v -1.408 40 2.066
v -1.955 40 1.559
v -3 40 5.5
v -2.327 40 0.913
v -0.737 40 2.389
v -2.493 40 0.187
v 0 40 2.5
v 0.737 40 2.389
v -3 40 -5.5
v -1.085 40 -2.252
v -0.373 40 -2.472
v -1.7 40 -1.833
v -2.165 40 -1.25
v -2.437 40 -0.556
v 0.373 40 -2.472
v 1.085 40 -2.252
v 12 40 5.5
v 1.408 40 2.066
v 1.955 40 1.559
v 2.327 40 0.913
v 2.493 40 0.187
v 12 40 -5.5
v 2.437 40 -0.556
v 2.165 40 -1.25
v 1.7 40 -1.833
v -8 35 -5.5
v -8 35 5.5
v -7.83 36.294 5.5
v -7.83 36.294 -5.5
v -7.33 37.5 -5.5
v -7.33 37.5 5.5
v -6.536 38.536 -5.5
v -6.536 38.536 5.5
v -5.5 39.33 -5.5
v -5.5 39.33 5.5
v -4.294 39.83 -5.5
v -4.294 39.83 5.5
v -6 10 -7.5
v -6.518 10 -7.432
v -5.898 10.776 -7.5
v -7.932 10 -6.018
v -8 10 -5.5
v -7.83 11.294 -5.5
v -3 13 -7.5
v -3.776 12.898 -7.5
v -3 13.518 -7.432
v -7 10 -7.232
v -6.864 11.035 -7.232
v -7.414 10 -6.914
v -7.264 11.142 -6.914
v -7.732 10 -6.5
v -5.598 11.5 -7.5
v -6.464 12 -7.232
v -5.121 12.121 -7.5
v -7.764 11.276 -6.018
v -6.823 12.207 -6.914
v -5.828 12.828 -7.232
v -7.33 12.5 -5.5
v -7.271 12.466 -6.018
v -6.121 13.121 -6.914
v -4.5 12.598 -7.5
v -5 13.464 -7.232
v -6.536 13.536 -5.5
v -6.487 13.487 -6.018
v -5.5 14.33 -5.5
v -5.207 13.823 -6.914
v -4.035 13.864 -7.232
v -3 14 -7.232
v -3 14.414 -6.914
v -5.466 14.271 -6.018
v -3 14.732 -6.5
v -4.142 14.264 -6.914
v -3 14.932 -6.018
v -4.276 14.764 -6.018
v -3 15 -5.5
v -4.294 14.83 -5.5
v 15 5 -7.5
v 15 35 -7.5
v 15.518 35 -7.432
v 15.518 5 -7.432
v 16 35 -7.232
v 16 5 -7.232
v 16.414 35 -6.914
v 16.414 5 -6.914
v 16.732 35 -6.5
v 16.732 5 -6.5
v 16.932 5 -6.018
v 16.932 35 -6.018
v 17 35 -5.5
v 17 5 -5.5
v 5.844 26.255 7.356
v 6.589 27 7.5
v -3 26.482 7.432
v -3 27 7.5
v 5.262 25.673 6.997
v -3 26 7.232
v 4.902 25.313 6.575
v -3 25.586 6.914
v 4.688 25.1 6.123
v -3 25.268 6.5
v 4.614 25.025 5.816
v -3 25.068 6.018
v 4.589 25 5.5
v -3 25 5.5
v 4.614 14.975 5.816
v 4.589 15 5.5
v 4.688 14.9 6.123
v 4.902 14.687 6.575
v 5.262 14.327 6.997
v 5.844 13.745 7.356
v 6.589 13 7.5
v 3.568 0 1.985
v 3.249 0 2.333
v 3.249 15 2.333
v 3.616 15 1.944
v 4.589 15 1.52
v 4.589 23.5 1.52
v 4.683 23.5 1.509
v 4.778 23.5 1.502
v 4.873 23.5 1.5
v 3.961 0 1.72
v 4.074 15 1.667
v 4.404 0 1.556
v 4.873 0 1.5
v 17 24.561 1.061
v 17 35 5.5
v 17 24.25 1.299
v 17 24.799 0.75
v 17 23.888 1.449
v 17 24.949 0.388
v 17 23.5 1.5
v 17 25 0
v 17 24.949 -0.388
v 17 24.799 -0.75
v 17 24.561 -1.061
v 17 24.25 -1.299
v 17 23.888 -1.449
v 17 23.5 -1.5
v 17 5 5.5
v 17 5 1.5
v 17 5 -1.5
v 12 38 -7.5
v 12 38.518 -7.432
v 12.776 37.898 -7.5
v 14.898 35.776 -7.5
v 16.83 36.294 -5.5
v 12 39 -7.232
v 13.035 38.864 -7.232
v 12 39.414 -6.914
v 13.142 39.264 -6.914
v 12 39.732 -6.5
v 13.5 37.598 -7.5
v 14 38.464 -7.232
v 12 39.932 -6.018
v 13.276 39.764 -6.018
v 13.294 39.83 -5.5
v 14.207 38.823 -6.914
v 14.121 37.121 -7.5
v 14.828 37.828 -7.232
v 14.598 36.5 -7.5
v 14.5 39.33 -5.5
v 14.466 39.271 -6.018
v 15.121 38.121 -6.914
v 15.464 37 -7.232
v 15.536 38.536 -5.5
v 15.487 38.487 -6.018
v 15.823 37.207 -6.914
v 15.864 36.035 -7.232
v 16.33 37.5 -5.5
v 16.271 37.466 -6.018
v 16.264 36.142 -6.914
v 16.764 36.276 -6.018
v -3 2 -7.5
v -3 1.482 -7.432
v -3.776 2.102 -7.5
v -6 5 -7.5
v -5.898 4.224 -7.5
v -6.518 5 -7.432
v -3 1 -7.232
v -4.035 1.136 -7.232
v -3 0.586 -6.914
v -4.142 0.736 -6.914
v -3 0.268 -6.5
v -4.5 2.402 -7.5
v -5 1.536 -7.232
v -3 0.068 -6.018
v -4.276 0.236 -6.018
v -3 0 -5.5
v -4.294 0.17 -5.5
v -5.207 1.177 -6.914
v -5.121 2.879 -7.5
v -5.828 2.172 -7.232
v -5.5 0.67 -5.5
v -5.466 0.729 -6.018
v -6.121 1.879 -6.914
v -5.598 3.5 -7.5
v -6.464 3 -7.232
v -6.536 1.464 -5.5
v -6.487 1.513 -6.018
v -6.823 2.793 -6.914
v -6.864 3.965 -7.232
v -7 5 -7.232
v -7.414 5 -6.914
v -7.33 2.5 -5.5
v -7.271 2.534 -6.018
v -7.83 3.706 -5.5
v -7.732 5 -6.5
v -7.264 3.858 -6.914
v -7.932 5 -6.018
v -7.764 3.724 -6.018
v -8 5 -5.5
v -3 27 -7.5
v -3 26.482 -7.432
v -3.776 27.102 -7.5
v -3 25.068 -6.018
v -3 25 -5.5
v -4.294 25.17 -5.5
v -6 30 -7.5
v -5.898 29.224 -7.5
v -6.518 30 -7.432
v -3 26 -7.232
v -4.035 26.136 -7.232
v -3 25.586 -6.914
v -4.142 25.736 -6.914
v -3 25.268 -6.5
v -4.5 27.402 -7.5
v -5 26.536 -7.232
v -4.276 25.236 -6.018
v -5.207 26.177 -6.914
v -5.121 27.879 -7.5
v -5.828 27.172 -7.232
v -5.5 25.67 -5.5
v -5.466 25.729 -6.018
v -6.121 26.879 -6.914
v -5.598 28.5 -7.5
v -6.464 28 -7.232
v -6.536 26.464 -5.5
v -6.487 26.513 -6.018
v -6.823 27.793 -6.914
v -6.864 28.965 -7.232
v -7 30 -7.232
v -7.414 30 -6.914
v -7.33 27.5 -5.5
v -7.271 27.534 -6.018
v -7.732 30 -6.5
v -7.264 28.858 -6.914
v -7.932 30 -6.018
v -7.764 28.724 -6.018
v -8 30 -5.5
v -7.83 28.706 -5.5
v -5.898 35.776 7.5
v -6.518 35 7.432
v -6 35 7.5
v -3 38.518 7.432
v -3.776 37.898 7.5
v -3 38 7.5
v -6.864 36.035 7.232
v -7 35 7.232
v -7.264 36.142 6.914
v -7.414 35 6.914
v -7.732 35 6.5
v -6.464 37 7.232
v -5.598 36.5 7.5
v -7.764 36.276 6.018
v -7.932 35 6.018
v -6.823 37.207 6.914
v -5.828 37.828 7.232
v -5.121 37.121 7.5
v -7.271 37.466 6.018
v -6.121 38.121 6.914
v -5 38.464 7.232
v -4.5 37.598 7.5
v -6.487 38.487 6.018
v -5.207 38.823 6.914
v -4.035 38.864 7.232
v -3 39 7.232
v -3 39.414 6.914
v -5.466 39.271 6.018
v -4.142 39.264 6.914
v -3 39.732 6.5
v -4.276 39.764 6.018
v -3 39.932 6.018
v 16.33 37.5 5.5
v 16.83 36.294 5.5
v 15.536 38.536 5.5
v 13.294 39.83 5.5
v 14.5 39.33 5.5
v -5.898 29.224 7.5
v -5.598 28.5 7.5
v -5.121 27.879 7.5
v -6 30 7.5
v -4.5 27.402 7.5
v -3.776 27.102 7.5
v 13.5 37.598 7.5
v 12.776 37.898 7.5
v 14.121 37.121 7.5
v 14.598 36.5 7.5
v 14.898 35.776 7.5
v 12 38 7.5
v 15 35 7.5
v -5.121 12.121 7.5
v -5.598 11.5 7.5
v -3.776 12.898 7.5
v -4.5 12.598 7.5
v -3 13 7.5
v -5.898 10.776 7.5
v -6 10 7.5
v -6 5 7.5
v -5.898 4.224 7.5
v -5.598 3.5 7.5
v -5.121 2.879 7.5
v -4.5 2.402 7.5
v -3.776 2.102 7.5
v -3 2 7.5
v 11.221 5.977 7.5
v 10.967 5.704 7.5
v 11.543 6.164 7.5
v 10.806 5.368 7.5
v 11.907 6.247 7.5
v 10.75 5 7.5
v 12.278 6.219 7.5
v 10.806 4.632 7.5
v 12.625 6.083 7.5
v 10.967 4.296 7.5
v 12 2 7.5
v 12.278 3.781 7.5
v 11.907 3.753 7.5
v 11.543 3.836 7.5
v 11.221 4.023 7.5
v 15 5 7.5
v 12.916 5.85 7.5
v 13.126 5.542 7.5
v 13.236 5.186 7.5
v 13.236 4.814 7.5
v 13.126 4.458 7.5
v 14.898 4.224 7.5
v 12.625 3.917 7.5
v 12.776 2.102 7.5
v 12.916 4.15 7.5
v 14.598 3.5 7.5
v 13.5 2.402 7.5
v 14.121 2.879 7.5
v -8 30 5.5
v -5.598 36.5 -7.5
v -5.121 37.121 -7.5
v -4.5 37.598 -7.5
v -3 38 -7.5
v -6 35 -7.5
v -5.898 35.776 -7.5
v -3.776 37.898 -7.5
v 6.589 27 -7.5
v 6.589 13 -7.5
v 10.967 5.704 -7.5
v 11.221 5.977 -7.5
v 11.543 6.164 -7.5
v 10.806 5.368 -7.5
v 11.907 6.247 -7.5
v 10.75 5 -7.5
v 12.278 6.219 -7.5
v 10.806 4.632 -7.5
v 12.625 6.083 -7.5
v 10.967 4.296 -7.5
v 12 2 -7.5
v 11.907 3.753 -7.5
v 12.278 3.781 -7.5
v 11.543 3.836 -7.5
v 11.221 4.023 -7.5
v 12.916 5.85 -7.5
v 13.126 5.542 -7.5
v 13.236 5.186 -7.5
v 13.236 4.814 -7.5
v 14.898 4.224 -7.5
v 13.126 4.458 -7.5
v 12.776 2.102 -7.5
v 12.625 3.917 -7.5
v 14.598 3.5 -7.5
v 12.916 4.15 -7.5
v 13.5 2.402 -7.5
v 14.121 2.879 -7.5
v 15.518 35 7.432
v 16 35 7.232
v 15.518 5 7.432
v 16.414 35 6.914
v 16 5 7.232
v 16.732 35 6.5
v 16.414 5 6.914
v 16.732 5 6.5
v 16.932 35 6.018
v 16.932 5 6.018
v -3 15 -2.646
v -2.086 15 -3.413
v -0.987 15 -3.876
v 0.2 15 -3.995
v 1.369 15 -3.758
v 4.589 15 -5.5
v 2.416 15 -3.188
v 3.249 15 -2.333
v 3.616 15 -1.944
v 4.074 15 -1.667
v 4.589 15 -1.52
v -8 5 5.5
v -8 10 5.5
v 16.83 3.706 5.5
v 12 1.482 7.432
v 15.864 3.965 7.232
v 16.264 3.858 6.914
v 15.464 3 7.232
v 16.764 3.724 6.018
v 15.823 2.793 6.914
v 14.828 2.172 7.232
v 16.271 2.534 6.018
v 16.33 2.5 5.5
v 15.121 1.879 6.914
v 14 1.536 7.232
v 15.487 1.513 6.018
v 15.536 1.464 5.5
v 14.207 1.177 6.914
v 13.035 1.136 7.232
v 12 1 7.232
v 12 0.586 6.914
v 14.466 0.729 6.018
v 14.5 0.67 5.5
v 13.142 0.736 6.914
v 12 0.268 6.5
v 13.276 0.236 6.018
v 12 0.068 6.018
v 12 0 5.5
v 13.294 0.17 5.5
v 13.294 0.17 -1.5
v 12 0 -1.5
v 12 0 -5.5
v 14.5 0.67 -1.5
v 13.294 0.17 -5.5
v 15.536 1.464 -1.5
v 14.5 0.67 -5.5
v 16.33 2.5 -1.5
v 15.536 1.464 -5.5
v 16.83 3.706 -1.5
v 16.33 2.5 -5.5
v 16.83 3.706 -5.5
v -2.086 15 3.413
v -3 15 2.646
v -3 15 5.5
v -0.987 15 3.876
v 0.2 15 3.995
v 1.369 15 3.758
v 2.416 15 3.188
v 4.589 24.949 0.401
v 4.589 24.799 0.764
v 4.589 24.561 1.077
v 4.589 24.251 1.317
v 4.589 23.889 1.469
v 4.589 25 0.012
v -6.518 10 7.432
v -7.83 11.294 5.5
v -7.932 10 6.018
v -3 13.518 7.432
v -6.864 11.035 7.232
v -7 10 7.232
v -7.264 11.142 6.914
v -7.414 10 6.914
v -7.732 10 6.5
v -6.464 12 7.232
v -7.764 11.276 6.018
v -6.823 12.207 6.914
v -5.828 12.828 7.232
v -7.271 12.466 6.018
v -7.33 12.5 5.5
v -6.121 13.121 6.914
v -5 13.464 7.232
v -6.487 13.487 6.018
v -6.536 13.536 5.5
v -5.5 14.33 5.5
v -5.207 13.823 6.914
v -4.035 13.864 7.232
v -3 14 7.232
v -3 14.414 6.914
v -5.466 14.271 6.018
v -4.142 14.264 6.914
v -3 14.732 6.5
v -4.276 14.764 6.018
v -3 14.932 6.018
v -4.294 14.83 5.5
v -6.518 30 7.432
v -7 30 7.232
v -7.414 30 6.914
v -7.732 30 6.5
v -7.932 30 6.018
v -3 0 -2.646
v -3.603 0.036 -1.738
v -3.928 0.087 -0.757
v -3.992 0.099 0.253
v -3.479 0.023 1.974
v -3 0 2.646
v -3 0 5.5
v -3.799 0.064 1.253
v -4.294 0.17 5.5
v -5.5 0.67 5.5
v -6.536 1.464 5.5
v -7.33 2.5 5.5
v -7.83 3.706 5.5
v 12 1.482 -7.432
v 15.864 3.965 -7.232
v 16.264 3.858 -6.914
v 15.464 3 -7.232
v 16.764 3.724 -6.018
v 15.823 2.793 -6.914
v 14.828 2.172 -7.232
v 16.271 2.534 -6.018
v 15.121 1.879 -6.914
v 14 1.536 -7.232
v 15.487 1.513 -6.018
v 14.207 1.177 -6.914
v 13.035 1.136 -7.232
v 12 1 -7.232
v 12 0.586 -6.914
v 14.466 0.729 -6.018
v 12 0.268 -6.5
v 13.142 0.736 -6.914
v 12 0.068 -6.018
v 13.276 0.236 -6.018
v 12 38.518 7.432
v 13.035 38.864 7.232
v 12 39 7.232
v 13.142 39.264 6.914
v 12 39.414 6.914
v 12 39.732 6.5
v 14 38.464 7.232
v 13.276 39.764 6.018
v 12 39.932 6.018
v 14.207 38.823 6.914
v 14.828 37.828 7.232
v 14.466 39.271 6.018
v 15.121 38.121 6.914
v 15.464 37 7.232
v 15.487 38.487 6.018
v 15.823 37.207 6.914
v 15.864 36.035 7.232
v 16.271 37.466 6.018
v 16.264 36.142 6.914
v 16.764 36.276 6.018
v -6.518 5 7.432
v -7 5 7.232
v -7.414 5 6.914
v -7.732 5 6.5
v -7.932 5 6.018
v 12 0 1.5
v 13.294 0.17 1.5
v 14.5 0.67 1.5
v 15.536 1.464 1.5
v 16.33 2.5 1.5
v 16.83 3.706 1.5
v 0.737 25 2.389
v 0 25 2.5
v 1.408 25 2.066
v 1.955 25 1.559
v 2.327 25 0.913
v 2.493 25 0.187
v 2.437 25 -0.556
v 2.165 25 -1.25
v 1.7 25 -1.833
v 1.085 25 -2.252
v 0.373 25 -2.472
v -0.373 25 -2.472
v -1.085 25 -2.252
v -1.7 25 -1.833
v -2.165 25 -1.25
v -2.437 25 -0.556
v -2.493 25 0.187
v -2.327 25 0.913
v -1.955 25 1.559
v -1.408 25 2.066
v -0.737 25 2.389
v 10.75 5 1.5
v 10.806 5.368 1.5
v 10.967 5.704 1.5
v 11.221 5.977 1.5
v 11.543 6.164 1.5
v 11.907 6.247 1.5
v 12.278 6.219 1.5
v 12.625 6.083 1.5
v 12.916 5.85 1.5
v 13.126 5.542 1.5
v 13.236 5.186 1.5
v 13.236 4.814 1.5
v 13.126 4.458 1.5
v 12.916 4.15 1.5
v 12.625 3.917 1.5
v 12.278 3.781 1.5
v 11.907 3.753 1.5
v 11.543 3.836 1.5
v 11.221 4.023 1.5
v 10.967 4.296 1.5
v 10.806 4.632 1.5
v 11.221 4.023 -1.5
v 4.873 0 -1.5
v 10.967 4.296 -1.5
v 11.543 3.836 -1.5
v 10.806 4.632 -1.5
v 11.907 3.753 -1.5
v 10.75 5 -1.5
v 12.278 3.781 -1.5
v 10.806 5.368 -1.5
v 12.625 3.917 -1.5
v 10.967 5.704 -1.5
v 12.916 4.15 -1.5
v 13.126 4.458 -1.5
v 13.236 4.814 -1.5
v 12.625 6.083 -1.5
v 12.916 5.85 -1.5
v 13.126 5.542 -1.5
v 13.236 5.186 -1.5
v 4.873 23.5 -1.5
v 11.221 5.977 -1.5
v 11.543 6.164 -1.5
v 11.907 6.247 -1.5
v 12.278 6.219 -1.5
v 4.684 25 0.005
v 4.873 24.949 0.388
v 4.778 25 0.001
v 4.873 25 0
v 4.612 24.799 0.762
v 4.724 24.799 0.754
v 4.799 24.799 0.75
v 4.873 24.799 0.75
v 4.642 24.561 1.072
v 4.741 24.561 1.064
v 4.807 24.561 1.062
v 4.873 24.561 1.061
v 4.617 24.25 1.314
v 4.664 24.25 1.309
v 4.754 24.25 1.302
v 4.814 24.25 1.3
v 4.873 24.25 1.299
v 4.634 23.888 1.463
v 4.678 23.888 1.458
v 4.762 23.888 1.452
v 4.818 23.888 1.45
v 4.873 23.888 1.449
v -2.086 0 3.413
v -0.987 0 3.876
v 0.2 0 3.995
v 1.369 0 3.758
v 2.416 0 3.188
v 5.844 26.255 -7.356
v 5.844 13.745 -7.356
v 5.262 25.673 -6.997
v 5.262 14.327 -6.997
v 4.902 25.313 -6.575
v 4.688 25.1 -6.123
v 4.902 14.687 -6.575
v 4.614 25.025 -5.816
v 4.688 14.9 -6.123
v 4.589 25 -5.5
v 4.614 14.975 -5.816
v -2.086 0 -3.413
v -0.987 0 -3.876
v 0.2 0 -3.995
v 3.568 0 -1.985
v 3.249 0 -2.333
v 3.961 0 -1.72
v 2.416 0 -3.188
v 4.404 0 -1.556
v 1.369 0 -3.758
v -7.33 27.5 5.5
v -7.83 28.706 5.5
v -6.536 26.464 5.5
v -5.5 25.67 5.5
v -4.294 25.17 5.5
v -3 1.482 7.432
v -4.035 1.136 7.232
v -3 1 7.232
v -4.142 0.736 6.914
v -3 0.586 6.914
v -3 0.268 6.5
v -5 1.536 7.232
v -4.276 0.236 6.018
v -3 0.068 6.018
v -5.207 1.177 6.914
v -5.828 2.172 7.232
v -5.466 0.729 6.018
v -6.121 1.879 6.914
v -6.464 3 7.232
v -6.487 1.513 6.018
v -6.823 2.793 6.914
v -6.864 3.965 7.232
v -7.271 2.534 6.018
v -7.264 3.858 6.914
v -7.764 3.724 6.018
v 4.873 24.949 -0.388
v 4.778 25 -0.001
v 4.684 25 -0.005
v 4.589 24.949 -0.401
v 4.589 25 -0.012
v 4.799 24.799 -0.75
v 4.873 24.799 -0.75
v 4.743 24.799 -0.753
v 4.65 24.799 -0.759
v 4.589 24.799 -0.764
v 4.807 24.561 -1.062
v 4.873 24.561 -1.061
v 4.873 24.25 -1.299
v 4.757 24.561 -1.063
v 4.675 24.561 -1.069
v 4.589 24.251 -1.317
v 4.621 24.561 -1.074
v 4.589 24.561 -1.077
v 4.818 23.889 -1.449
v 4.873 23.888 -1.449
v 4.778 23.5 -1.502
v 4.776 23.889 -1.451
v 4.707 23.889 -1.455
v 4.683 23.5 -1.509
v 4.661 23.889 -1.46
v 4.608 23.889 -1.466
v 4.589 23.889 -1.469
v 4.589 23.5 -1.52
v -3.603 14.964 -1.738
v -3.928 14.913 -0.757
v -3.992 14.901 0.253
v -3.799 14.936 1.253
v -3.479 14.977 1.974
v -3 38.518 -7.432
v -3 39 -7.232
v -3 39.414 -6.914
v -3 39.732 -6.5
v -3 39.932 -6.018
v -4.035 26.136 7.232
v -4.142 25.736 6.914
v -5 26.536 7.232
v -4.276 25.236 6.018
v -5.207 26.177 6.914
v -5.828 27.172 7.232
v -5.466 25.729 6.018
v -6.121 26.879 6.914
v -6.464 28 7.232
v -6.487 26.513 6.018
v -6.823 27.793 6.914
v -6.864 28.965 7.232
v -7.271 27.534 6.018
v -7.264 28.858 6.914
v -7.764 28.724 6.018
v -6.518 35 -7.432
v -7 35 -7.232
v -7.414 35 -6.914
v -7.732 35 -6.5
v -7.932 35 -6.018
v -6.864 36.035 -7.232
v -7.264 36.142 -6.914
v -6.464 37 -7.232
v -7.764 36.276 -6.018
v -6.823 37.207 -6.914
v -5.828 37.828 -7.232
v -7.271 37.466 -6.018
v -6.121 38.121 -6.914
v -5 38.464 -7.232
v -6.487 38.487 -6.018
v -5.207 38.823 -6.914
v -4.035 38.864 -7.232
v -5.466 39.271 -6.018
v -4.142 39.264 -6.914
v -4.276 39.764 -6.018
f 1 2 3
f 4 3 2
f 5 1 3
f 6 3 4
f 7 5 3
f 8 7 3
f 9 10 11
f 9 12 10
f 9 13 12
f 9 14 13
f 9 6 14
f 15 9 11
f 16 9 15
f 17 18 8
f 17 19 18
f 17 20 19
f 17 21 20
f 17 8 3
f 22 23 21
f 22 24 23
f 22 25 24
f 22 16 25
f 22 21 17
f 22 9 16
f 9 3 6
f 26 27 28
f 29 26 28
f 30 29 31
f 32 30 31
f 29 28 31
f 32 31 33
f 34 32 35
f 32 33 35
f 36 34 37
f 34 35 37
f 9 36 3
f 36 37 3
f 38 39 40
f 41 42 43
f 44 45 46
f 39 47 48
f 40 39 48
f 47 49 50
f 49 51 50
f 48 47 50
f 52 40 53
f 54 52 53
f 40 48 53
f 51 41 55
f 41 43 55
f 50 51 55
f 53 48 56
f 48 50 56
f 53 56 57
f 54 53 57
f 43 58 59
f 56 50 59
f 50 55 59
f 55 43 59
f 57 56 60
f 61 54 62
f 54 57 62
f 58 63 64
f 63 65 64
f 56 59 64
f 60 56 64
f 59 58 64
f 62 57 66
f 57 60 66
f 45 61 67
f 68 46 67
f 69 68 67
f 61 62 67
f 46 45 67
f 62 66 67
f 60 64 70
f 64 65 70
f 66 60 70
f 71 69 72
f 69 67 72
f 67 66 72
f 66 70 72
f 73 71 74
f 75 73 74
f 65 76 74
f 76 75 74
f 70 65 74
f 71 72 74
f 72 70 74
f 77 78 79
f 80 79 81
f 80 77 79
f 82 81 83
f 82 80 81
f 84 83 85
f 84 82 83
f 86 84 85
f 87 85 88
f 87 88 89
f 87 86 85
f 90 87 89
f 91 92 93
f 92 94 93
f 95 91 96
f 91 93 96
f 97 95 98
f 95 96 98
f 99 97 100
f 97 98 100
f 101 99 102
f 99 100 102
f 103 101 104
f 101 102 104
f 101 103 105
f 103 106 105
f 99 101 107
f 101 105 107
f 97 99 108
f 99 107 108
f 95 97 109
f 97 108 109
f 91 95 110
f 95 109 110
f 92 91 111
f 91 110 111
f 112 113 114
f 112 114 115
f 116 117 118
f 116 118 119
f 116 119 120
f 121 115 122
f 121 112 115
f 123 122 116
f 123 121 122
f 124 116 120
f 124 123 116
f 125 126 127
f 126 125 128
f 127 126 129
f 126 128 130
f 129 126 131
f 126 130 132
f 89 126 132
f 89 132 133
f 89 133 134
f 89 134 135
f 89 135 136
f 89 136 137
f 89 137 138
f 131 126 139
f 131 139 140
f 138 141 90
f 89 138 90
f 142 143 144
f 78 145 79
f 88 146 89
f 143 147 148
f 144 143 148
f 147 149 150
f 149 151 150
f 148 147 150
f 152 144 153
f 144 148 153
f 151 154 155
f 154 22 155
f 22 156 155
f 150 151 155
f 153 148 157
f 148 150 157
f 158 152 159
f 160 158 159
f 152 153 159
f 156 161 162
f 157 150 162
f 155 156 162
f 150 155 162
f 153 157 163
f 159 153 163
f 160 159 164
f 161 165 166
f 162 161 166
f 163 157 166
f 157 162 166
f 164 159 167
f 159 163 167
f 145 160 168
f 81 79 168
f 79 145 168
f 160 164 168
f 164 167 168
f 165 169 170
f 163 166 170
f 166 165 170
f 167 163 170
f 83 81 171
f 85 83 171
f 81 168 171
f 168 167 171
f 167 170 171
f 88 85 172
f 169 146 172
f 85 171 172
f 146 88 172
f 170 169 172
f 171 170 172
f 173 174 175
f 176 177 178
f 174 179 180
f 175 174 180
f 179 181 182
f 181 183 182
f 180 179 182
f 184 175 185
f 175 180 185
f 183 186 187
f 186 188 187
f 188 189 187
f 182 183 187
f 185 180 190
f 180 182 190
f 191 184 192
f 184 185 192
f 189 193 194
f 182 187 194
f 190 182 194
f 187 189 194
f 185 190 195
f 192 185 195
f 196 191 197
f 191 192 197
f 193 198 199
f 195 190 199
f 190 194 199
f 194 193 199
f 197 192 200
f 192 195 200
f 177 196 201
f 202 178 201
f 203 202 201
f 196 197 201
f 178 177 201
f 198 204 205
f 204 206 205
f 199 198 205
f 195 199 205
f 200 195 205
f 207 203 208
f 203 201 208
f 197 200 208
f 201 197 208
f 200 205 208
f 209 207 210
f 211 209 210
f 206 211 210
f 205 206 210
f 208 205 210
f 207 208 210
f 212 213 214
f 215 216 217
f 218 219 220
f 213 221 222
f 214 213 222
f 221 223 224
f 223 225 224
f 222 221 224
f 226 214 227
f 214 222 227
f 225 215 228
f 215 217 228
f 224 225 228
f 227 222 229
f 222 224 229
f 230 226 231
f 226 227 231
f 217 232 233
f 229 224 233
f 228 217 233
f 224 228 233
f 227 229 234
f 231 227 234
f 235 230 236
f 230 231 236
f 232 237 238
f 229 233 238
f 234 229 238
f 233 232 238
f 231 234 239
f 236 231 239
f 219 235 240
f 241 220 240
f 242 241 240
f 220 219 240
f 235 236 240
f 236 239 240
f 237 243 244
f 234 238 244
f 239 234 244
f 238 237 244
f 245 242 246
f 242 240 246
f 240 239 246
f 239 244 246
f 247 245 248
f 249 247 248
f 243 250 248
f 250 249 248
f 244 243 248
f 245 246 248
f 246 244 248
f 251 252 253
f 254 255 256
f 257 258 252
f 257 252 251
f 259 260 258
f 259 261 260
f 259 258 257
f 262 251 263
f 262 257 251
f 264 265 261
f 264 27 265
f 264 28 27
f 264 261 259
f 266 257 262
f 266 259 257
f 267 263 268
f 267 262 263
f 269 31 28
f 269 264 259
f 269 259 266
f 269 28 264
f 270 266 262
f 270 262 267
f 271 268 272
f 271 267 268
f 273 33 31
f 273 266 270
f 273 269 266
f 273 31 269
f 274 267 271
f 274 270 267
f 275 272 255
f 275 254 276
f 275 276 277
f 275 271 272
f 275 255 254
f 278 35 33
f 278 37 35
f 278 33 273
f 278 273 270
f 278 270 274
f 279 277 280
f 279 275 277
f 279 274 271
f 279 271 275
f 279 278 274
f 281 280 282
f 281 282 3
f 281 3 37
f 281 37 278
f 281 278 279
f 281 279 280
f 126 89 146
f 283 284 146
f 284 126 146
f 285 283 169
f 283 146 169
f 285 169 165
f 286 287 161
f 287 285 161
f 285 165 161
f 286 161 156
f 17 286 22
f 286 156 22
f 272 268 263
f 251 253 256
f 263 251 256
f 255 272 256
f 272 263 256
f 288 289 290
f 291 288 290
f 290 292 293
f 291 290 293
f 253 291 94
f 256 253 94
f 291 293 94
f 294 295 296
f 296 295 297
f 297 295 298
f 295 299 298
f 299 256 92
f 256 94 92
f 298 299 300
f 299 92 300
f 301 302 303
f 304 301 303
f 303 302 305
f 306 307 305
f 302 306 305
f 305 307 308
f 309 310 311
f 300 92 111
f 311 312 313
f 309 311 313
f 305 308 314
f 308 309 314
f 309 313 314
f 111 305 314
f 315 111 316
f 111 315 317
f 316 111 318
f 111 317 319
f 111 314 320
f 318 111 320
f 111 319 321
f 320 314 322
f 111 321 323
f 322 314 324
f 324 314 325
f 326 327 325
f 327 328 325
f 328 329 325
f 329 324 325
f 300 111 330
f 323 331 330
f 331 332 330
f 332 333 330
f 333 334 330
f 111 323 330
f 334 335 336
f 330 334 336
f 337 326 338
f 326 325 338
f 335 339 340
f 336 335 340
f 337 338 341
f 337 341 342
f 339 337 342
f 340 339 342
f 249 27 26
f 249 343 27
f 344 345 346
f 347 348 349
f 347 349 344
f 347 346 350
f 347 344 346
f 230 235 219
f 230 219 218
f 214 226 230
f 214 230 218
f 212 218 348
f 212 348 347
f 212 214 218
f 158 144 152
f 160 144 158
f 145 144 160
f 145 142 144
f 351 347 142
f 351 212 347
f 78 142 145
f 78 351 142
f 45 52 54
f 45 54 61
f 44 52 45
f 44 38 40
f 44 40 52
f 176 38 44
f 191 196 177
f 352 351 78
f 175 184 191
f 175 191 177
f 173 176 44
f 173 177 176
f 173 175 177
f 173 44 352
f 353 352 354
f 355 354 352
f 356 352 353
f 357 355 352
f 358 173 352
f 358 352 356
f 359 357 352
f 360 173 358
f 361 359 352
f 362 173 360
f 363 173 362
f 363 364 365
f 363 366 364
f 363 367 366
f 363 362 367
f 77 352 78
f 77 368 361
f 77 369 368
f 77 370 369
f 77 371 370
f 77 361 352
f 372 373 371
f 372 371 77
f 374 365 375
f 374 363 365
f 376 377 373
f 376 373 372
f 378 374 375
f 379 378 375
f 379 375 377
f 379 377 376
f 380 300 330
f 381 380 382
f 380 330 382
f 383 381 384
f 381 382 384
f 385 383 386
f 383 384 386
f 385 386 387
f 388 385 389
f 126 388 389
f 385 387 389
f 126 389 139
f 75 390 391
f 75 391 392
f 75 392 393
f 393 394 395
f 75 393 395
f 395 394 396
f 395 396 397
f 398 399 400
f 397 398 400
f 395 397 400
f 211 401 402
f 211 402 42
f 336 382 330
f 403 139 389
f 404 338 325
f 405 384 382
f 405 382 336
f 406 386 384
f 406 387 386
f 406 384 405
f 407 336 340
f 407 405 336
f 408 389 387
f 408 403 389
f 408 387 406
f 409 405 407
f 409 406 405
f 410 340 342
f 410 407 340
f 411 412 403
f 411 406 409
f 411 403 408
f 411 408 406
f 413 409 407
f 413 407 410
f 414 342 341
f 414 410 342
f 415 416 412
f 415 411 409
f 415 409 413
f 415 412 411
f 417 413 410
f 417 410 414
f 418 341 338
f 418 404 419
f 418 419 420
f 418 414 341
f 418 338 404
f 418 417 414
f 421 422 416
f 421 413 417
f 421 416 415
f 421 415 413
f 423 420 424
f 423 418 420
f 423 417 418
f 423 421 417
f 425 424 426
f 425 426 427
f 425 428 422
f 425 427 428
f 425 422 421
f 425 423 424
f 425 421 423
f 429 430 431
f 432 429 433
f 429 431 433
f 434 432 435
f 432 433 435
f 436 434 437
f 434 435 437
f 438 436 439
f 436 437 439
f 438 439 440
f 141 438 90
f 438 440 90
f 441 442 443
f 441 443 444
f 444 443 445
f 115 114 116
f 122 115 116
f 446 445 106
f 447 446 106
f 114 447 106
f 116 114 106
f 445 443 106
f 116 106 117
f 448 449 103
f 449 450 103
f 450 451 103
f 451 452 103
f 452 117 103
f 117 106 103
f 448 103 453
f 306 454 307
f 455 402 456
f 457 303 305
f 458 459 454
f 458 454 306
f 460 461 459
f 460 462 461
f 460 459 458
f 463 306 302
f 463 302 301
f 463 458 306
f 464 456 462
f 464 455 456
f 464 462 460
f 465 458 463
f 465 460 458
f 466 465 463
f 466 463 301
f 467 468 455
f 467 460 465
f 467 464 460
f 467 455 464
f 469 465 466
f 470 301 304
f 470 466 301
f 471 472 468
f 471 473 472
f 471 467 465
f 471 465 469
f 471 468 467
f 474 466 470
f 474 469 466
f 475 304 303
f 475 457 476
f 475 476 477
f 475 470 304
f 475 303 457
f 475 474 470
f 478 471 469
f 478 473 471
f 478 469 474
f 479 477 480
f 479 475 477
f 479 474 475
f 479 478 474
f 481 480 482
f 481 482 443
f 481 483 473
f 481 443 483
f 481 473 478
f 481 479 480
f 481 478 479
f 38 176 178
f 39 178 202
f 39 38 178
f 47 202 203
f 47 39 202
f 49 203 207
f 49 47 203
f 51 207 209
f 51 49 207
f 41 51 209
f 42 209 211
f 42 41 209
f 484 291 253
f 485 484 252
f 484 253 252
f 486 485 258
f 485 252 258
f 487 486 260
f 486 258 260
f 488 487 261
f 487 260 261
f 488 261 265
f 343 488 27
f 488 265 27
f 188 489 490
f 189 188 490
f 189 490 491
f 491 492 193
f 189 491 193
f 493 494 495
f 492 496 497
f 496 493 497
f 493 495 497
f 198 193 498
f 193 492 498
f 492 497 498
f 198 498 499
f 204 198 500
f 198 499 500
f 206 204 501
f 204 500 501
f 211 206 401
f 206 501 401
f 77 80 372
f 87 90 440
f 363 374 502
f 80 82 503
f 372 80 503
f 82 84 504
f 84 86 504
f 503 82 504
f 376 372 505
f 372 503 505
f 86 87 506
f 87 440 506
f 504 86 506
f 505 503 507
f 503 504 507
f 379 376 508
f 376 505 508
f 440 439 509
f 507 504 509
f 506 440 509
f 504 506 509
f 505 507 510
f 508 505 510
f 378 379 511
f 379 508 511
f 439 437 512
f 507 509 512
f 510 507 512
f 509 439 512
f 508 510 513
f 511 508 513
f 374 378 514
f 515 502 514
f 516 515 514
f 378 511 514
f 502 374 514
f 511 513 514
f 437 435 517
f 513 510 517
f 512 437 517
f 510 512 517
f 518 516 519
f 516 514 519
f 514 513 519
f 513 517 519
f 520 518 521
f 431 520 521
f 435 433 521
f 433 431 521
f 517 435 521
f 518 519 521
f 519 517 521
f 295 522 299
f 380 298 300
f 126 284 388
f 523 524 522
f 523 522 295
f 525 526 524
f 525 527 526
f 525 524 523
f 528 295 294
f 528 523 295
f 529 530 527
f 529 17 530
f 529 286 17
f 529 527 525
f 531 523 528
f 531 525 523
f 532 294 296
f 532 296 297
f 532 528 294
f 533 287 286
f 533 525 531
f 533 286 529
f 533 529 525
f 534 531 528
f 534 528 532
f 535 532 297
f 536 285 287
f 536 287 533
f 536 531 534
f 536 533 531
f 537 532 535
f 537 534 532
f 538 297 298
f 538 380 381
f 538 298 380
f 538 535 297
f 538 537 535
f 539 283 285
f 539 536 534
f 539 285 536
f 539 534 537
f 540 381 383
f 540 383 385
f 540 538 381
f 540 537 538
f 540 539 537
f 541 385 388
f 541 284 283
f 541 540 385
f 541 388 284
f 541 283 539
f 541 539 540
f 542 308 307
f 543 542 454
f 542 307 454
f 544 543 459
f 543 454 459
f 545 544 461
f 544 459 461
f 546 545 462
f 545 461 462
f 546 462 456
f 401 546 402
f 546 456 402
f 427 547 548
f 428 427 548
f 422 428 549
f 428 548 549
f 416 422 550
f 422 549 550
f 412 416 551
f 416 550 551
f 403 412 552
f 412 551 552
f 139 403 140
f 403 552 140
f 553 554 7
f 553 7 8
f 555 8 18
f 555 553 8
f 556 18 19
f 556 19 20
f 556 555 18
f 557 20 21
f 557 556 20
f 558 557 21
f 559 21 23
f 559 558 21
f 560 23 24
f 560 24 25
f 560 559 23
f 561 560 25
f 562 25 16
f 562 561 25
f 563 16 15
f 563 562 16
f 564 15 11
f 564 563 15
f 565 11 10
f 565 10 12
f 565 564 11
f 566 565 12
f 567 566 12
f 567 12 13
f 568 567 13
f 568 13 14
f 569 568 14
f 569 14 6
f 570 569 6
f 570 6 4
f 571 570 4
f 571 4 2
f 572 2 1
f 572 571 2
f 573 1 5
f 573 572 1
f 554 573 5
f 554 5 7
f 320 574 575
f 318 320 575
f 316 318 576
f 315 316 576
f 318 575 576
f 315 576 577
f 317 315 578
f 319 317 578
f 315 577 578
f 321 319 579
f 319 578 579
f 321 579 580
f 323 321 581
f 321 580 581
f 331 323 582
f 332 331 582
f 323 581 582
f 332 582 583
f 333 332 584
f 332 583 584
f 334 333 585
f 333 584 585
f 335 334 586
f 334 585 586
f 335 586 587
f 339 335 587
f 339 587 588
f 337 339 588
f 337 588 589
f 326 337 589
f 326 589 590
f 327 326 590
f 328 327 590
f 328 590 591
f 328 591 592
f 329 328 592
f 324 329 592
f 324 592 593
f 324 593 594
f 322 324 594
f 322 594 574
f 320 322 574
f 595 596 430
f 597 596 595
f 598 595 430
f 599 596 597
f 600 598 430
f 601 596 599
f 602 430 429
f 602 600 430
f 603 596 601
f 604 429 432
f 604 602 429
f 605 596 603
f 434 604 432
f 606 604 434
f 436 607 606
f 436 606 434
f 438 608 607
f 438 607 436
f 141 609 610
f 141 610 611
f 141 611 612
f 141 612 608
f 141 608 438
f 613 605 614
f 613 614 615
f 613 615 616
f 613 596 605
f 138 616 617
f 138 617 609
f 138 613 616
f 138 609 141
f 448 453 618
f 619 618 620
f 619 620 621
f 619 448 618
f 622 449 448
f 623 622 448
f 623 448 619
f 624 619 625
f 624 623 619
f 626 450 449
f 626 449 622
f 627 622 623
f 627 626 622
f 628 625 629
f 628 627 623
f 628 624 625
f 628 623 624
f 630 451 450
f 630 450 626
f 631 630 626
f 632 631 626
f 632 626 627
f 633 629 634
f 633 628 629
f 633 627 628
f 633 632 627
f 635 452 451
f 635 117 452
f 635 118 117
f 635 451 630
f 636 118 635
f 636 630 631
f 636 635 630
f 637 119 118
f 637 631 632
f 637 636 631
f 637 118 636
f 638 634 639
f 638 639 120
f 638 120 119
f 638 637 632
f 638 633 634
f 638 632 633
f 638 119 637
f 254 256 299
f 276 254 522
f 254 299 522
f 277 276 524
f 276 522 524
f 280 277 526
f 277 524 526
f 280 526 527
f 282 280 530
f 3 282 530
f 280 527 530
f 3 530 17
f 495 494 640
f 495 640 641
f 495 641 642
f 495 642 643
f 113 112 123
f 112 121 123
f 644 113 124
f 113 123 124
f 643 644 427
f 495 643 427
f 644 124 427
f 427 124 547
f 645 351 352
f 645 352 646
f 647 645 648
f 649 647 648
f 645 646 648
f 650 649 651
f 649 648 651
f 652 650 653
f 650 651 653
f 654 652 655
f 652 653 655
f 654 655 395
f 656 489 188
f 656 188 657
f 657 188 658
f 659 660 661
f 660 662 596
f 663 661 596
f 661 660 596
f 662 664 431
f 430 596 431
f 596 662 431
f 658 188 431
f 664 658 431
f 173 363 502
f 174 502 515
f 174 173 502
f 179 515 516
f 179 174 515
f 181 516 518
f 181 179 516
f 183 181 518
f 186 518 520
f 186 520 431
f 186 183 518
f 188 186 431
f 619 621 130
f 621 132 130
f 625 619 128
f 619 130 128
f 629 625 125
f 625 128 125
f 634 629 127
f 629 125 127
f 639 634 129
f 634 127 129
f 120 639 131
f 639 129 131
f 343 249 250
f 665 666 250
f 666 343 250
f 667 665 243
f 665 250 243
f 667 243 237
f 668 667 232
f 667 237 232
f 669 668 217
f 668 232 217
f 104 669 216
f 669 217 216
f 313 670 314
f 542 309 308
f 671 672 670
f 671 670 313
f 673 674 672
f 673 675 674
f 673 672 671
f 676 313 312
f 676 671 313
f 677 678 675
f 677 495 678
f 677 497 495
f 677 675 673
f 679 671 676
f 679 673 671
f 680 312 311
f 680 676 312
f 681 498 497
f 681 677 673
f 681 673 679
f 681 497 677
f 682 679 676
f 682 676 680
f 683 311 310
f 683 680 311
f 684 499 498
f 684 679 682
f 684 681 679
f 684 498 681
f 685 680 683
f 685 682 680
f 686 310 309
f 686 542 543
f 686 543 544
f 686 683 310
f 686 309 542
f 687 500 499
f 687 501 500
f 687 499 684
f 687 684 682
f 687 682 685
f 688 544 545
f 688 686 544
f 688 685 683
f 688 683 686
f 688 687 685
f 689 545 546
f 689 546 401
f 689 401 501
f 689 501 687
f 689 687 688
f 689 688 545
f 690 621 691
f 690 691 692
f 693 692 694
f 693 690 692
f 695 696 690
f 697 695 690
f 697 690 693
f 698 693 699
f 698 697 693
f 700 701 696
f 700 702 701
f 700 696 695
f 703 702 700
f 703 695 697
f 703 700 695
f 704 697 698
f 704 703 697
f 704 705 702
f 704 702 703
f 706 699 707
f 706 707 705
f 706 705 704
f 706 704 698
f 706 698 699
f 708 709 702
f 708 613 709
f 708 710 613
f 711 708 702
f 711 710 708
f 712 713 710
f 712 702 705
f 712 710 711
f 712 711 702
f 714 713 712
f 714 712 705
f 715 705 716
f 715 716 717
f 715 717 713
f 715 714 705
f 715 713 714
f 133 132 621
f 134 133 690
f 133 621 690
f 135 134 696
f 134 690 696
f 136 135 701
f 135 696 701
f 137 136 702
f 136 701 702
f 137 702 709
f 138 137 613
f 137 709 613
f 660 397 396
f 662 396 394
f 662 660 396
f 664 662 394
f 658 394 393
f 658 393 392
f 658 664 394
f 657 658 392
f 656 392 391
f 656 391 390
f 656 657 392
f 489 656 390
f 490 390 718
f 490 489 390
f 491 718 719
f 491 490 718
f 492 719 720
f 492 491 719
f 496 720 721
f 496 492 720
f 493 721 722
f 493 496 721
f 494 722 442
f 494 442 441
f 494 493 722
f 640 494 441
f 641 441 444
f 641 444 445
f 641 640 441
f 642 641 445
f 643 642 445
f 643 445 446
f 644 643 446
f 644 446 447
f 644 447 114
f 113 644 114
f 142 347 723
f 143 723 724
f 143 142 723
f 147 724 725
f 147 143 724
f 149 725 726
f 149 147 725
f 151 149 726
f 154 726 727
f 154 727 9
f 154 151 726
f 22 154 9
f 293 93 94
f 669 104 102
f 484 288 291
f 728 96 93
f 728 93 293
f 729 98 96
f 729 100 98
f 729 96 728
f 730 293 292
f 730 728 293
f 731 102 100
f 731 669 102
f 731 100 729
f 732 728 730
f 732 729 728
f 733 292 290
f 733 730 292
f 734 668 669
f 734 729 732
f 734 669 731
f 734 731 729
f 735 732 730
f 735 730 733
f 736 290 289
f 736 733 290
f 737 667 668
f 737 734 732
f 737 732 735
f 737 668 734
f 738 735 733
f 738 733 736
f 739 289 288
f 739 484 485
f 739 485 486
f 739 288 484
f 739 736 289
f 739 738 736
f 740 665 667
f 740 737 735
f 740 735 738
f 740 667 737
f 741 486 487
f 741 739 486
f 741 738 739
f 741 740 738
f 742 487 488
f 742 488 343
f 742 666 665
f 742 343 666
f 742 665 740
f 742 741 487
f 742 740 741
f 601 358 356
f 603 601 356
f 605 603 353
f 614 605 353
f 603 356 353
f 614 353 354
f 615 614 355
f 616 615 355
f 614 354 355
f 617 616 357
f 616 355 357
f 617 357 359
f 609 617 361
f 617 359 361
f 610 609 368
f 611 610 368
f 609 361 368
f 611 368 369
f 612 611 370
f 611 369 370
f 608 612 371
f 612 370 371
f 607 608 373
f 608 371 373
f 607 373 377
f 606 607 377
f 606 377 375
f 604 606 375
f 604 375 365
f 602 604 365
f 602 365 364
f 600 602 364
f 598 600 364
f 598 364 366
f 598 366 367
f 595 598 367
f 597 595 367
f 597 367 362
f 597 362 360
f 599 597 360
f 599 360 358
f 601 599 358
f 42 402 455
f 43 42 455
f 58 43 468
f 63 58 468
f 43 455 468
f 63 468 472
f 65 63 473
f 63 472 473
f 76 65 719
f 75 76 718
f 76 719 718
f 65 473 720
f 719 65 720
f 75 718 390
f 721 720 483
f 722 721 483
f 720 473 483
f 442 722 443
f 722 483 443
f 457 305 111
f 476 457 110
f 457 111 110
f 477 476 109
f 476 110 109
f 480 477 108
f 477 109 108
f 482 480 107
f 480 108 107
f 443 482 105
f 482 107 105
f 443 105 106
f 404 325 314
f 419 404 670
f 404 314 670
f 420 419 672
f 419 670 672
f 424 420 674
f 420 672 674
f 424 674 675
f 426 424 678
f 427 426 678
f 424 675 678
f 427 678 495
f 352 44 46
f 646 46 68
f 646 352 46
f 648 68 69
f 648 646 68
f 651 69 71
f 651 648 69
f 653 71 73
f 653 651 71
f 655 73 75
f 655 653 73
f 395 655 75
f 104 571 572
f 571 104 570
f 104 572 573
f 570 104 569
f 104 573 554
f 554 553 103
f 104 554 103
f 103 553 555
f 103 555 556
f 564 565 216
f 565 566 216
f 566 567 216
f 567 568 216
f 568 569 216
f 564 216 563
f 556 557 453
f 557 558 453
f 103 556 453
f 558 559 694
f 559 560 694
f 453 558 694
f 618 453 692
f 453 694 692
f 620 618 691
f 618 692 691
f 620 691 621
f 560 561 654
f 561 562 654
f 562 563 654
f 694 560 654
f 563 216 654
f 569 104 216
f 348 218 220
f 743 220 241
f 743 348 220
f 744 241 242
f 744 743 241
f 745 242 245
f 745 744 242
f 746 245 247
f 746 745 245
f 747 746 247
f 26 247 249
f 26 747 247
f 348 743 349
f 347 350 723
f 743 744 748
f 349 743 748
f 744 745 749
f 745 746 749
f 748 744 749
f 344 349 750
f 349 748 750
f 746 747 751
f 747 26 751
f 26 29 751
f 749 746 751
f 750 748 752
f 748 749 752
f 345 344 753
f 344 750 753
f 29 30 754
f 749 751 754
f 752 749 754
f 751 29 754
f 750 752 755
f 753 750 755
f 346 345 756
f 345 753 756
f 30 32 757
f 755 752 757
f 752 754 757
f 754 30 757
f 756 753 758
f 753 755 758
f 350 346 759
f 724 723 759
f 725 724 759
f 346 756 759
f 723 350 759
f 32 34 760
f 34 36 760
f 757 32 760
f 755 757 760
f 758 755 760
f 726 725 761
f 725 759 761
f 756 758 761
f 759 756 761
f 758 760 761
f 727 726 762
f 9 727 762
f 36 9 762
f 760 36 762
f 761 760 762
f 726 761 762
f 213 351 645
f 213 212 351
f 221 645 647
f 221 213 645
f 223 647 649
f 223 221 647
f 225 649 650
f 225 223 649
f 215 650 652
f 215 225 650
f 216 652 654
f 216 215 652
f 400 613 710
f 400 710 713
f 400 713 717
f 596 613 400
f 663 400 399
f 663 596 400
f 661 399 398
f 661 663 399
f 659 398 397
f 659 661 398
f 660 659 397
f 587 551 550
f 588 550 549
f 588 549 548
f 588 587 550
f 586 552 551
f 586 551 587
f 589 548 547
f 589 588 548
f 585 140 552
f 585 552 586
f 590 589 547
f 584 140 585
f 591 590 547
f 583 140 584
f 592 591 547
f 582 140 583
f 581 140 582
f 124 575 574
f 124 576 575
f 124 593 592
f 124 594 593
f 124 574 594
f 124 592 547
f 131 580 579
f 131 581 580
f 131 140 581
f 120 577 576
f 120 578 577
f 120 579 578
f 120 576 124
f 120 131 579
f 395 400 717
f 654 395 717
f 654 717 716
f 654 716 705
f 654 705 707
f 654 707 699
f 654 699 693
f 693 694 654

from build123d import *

# Parameters (mm, degrees)
SKIZZE1_W                       = 25
SKIZZE1_H                       = 15
SKIZZE1_R                       = 4
AUFSATZ_LINEAR_AUSTRAGEN1_DEPTH = 40
SCHNITT_LINEAR_START            = -15
SCHNITT_LINEAR_AUSTRAGEN1_DEPTH = 71
M3_GEWINDEBOHRUNG1_D            = 2.5
VERRUNDUNG2_R                   = 2
SKIZZE5_W                       = 17.099513742
SKIZZE5_H                       = 10
SCHNITT_LINEAR_AUSTRAGEN2_DEPTH = 13
AUFSATZ_LINEAR_START            = -15
SKIZZE6_R                       = 4
SKIZZE6_R_2                     = 2.5
AUFSATZ_LINEAR_AUSTRAGEN2_DEPTH = 15
VERRUNDUNG5_R                   = 5
VERRUNDUNG6_R                   = 2
VERRUNDUNG7_R                   = 1.5


# Some blends are built 0.0001 mm under size
with BuildPart() as part:
    # Skizze1 → Aufsatz-Linear austragen1 (new body)
    with BuildSketch(Plane(origin=(0, 0, 0), x_dir=(1, 0, 0), z_dir=(0, 1, 0))):
        with Locations((4.5, 0)):
            Rectangle(SKIZZE1_W, SKIZZE1_H)
        with Locations(Location((0, 0, 0), (0, 0, 270))):
            Circle(SKIZZE1_R, mode=Mode.SUBTRACT)
    extrude(amount=AUFSATZ_LINEAR_AUSTRAGEN1_DEPTH)

    # Skizze2 → Schnitt-Linear austragen1 (cut)
    with BuildSketch(Plane(origin=(0, 40, 0), x_dir=(1, 0, 0), z_dir=(0, 1, 0)).offset(SCHNITT_LINEAR_START)):
        with BuildLine():
            Line((0, 1.5), (23.752899364, 1.5))
            ThreePointArc((23.752899364, 1.5), (25.252899364, 0), (23.752899364, -1.5))
            Line((23.752899364, -1.5), (0, -1.5))
            ThreePointArc((0, -1.5), (-1.5, 0), (0, 1.5))
        make_face()
    extrude(amount=-SCHNITT_LINEAR_AUSTRAGEN1_DEPTH, mode=Mode.SUBTRACT)

    # M3 Gewindebohrung1 (through all)
    with Locations(Plane.XY.offset(7.5)):
        with Locations((12, 5)):
            Hole(M3_GEWINDEBOHRUNG1_D / 2)

    # Verrundung2
    verrundung2_edges = [part.edges().sort_by_distance(p)[0] for p in [
        (3.708099244, 12.5, 1.5),
        (3.708099244, 12.5, -1.5),
    ]]
    fillet(verrundung2_edges, radius=VERRUNDUNG2_R)

    # Skizze5 → Schnitt-Linear austragen2 (cut, symmetric)
    with BuildSketch(Plane.XY):
        with Locations((-3.960992506, 20)):
            Rectangle(SKIZZE5_W, SKIZZE5_H)
    extrude(amount=SCHNITT_LINEAR_AUSTRAGEN2_DEPTH, both=True, mode=Mode.SUBTRACT)

    # Skizze6 → Aufsatz-Linear austragen2 (add)
    with BuildSketch(Plane(origin=(0, 40, 0), x_dir=(1, 0, 0), z_dir=(0, 1, 0)).offset(AUFSATZ_LINEAR_START)):
        Circle(SKIZZE6_R)
        with Locations(Location((0, 0, 0), (0, 0, 270))):
            Circle(SKIZZE6_R_2, mode=Mode.SUBTRACT)
    extrude(amount=AUFSATZ_LINEAR_AUSTRAGEN2_DEPTH)

    # Verrundung5
    # the kernel refuses this fillet: 5 mm, written as the material it takes off along each edge
    with BuildSketch(Plane(origin=(17, 40, -20), x_dir=(0, -1, 0), z_dir=(0, 0, 1)), Plane(origin=(-8, 0, 20), x_dir=(1, 0, 0), z_dir=(0, 0, -1)), Plane(origin=(-8, 15, 20), x_dir=(0, -1, 0), z_dir=(0, 0, -1))) as verrundung5_piece_1:
        with BuildLine():
            CenterArc((VERRUNDUNG5_R, -VERRUNDUNG5_R), VERRUNDUNG5_R, 90, 90)
            Line((0, -VERRUNDUNG5_R), (0, 0))
            Line((0, 0), (VERRUNDUNG5_R, 0))
        make_face()
    extrude(amount=40, mode=Mode.SUBTRACT)
    with BuildSketch(Plane(origin=(17, 0, -20), x_dir=(-1, 0, 0), z_dir=(0, 0, 1)), Plane(origin=(17, 0, -11), x_dir=(-1, 0, 0), z_dir=(0, 0, 1))) as verrundung5_piece_2:
        with BuildLine():
            CenterArc((VERRUNDUNG5_R, -VERRUNDUNG5_R), VERRUNDUNG5_R, 90, 90)
            Line((0, -VERRUNDUNG5_R), (0, 0))
            Line((0, 0), (VERRUNDUNG5_R, 0))
        make_face()
    extrude(amount=31, mode=Mode.SUBTRACT)
    with BuildSketch(Plane(origin=(-8, 40, 20), x_dir=(1, 0, 0), z_dir=(0, 0, -1)), Plane(origin=(-8, 25, -20), x_dir=(1, 0, 0), z_dir=(0, 0, 1))) as verrundung5_piece_3:
        with BuildLine():
            CenterArc((VERRUNDUNG5_R, VERRUNDUNG5_R), VERRUNDUNG5_R, 180, 90)
            Line((0, VERRUNDUNG5_R), (0, 0))
            Line((0, 0), (VERRUNDUNG5_R, 0))
        make_face()
    extrude(amount=40, mode=Mode.SUBTRACT)

    # Verrundung6
    verrundung6_edges = [part.edges().sort_by_distance(p)[0] for p in [
        (-8, 7.5, 7.5),
        (-8, 7.5, -7.5),
        (-8, 32.5, 7.5),
        (0.794382183, 25, 7.5),
        (4.5, 0, 7.5),
        (17, 20, 7.5),
        (4.5, 40, 7.5),
        (15.535533906, 1.464466094, 7.5),
        (15.535533906, 38.535533906, 7.5),
        (-6.535533906, 38.535533906, 7.5),
        (-6.535533906, 26.464466094, 7.5),
        (-6.535533906, 13.535533906, 7.5),
        (-6.535533906, 1.464466094, 7.5),
        (4.5, 0, -7.5),
        (-8, 32.5, -7.5),
        (4.5, 40, -7.5),
        (17, 20, -7.5),
        (0.794382183, 15, -7.5),
        (15.535533906, 1.464466094, -7.5),
        (15.535533906, 38.535533906, -7.5),
        (-6.535533906, 38.535533906, -7.5),
        (-6.535533906, 26.464466094, -7.5),
        (-6.535533906, 13.535533906, -7.5),
        (-6.535533906, 1.464466094, -7.5),
        (0.794382183, 25, -7.5),
        (4.588764365, 20, 7.5),
        (4.588764365, 20, -7.5),
        (0.794382183, 15, 7.5),
    ]]
    fillet(verrundung6_edges, radius=VERRUNDUNG6_R)

    # Verrundung7
    verrundung7_edges = [part.edges().sort_by_distance(p)[0] for p in [
        (4.730717229, 25, 1.505095884),
        (4.730717229, 25, -1.505095884),
        (10.936698586, 25, 1.5),
        (10.936698586, 25, -1.5),
    ]]
    fillet(verrundung7_edges, radius=VERRUNDUNG7_R - 0.0001)  # a hair under: the kernel refuses the full size


solid = part.part
